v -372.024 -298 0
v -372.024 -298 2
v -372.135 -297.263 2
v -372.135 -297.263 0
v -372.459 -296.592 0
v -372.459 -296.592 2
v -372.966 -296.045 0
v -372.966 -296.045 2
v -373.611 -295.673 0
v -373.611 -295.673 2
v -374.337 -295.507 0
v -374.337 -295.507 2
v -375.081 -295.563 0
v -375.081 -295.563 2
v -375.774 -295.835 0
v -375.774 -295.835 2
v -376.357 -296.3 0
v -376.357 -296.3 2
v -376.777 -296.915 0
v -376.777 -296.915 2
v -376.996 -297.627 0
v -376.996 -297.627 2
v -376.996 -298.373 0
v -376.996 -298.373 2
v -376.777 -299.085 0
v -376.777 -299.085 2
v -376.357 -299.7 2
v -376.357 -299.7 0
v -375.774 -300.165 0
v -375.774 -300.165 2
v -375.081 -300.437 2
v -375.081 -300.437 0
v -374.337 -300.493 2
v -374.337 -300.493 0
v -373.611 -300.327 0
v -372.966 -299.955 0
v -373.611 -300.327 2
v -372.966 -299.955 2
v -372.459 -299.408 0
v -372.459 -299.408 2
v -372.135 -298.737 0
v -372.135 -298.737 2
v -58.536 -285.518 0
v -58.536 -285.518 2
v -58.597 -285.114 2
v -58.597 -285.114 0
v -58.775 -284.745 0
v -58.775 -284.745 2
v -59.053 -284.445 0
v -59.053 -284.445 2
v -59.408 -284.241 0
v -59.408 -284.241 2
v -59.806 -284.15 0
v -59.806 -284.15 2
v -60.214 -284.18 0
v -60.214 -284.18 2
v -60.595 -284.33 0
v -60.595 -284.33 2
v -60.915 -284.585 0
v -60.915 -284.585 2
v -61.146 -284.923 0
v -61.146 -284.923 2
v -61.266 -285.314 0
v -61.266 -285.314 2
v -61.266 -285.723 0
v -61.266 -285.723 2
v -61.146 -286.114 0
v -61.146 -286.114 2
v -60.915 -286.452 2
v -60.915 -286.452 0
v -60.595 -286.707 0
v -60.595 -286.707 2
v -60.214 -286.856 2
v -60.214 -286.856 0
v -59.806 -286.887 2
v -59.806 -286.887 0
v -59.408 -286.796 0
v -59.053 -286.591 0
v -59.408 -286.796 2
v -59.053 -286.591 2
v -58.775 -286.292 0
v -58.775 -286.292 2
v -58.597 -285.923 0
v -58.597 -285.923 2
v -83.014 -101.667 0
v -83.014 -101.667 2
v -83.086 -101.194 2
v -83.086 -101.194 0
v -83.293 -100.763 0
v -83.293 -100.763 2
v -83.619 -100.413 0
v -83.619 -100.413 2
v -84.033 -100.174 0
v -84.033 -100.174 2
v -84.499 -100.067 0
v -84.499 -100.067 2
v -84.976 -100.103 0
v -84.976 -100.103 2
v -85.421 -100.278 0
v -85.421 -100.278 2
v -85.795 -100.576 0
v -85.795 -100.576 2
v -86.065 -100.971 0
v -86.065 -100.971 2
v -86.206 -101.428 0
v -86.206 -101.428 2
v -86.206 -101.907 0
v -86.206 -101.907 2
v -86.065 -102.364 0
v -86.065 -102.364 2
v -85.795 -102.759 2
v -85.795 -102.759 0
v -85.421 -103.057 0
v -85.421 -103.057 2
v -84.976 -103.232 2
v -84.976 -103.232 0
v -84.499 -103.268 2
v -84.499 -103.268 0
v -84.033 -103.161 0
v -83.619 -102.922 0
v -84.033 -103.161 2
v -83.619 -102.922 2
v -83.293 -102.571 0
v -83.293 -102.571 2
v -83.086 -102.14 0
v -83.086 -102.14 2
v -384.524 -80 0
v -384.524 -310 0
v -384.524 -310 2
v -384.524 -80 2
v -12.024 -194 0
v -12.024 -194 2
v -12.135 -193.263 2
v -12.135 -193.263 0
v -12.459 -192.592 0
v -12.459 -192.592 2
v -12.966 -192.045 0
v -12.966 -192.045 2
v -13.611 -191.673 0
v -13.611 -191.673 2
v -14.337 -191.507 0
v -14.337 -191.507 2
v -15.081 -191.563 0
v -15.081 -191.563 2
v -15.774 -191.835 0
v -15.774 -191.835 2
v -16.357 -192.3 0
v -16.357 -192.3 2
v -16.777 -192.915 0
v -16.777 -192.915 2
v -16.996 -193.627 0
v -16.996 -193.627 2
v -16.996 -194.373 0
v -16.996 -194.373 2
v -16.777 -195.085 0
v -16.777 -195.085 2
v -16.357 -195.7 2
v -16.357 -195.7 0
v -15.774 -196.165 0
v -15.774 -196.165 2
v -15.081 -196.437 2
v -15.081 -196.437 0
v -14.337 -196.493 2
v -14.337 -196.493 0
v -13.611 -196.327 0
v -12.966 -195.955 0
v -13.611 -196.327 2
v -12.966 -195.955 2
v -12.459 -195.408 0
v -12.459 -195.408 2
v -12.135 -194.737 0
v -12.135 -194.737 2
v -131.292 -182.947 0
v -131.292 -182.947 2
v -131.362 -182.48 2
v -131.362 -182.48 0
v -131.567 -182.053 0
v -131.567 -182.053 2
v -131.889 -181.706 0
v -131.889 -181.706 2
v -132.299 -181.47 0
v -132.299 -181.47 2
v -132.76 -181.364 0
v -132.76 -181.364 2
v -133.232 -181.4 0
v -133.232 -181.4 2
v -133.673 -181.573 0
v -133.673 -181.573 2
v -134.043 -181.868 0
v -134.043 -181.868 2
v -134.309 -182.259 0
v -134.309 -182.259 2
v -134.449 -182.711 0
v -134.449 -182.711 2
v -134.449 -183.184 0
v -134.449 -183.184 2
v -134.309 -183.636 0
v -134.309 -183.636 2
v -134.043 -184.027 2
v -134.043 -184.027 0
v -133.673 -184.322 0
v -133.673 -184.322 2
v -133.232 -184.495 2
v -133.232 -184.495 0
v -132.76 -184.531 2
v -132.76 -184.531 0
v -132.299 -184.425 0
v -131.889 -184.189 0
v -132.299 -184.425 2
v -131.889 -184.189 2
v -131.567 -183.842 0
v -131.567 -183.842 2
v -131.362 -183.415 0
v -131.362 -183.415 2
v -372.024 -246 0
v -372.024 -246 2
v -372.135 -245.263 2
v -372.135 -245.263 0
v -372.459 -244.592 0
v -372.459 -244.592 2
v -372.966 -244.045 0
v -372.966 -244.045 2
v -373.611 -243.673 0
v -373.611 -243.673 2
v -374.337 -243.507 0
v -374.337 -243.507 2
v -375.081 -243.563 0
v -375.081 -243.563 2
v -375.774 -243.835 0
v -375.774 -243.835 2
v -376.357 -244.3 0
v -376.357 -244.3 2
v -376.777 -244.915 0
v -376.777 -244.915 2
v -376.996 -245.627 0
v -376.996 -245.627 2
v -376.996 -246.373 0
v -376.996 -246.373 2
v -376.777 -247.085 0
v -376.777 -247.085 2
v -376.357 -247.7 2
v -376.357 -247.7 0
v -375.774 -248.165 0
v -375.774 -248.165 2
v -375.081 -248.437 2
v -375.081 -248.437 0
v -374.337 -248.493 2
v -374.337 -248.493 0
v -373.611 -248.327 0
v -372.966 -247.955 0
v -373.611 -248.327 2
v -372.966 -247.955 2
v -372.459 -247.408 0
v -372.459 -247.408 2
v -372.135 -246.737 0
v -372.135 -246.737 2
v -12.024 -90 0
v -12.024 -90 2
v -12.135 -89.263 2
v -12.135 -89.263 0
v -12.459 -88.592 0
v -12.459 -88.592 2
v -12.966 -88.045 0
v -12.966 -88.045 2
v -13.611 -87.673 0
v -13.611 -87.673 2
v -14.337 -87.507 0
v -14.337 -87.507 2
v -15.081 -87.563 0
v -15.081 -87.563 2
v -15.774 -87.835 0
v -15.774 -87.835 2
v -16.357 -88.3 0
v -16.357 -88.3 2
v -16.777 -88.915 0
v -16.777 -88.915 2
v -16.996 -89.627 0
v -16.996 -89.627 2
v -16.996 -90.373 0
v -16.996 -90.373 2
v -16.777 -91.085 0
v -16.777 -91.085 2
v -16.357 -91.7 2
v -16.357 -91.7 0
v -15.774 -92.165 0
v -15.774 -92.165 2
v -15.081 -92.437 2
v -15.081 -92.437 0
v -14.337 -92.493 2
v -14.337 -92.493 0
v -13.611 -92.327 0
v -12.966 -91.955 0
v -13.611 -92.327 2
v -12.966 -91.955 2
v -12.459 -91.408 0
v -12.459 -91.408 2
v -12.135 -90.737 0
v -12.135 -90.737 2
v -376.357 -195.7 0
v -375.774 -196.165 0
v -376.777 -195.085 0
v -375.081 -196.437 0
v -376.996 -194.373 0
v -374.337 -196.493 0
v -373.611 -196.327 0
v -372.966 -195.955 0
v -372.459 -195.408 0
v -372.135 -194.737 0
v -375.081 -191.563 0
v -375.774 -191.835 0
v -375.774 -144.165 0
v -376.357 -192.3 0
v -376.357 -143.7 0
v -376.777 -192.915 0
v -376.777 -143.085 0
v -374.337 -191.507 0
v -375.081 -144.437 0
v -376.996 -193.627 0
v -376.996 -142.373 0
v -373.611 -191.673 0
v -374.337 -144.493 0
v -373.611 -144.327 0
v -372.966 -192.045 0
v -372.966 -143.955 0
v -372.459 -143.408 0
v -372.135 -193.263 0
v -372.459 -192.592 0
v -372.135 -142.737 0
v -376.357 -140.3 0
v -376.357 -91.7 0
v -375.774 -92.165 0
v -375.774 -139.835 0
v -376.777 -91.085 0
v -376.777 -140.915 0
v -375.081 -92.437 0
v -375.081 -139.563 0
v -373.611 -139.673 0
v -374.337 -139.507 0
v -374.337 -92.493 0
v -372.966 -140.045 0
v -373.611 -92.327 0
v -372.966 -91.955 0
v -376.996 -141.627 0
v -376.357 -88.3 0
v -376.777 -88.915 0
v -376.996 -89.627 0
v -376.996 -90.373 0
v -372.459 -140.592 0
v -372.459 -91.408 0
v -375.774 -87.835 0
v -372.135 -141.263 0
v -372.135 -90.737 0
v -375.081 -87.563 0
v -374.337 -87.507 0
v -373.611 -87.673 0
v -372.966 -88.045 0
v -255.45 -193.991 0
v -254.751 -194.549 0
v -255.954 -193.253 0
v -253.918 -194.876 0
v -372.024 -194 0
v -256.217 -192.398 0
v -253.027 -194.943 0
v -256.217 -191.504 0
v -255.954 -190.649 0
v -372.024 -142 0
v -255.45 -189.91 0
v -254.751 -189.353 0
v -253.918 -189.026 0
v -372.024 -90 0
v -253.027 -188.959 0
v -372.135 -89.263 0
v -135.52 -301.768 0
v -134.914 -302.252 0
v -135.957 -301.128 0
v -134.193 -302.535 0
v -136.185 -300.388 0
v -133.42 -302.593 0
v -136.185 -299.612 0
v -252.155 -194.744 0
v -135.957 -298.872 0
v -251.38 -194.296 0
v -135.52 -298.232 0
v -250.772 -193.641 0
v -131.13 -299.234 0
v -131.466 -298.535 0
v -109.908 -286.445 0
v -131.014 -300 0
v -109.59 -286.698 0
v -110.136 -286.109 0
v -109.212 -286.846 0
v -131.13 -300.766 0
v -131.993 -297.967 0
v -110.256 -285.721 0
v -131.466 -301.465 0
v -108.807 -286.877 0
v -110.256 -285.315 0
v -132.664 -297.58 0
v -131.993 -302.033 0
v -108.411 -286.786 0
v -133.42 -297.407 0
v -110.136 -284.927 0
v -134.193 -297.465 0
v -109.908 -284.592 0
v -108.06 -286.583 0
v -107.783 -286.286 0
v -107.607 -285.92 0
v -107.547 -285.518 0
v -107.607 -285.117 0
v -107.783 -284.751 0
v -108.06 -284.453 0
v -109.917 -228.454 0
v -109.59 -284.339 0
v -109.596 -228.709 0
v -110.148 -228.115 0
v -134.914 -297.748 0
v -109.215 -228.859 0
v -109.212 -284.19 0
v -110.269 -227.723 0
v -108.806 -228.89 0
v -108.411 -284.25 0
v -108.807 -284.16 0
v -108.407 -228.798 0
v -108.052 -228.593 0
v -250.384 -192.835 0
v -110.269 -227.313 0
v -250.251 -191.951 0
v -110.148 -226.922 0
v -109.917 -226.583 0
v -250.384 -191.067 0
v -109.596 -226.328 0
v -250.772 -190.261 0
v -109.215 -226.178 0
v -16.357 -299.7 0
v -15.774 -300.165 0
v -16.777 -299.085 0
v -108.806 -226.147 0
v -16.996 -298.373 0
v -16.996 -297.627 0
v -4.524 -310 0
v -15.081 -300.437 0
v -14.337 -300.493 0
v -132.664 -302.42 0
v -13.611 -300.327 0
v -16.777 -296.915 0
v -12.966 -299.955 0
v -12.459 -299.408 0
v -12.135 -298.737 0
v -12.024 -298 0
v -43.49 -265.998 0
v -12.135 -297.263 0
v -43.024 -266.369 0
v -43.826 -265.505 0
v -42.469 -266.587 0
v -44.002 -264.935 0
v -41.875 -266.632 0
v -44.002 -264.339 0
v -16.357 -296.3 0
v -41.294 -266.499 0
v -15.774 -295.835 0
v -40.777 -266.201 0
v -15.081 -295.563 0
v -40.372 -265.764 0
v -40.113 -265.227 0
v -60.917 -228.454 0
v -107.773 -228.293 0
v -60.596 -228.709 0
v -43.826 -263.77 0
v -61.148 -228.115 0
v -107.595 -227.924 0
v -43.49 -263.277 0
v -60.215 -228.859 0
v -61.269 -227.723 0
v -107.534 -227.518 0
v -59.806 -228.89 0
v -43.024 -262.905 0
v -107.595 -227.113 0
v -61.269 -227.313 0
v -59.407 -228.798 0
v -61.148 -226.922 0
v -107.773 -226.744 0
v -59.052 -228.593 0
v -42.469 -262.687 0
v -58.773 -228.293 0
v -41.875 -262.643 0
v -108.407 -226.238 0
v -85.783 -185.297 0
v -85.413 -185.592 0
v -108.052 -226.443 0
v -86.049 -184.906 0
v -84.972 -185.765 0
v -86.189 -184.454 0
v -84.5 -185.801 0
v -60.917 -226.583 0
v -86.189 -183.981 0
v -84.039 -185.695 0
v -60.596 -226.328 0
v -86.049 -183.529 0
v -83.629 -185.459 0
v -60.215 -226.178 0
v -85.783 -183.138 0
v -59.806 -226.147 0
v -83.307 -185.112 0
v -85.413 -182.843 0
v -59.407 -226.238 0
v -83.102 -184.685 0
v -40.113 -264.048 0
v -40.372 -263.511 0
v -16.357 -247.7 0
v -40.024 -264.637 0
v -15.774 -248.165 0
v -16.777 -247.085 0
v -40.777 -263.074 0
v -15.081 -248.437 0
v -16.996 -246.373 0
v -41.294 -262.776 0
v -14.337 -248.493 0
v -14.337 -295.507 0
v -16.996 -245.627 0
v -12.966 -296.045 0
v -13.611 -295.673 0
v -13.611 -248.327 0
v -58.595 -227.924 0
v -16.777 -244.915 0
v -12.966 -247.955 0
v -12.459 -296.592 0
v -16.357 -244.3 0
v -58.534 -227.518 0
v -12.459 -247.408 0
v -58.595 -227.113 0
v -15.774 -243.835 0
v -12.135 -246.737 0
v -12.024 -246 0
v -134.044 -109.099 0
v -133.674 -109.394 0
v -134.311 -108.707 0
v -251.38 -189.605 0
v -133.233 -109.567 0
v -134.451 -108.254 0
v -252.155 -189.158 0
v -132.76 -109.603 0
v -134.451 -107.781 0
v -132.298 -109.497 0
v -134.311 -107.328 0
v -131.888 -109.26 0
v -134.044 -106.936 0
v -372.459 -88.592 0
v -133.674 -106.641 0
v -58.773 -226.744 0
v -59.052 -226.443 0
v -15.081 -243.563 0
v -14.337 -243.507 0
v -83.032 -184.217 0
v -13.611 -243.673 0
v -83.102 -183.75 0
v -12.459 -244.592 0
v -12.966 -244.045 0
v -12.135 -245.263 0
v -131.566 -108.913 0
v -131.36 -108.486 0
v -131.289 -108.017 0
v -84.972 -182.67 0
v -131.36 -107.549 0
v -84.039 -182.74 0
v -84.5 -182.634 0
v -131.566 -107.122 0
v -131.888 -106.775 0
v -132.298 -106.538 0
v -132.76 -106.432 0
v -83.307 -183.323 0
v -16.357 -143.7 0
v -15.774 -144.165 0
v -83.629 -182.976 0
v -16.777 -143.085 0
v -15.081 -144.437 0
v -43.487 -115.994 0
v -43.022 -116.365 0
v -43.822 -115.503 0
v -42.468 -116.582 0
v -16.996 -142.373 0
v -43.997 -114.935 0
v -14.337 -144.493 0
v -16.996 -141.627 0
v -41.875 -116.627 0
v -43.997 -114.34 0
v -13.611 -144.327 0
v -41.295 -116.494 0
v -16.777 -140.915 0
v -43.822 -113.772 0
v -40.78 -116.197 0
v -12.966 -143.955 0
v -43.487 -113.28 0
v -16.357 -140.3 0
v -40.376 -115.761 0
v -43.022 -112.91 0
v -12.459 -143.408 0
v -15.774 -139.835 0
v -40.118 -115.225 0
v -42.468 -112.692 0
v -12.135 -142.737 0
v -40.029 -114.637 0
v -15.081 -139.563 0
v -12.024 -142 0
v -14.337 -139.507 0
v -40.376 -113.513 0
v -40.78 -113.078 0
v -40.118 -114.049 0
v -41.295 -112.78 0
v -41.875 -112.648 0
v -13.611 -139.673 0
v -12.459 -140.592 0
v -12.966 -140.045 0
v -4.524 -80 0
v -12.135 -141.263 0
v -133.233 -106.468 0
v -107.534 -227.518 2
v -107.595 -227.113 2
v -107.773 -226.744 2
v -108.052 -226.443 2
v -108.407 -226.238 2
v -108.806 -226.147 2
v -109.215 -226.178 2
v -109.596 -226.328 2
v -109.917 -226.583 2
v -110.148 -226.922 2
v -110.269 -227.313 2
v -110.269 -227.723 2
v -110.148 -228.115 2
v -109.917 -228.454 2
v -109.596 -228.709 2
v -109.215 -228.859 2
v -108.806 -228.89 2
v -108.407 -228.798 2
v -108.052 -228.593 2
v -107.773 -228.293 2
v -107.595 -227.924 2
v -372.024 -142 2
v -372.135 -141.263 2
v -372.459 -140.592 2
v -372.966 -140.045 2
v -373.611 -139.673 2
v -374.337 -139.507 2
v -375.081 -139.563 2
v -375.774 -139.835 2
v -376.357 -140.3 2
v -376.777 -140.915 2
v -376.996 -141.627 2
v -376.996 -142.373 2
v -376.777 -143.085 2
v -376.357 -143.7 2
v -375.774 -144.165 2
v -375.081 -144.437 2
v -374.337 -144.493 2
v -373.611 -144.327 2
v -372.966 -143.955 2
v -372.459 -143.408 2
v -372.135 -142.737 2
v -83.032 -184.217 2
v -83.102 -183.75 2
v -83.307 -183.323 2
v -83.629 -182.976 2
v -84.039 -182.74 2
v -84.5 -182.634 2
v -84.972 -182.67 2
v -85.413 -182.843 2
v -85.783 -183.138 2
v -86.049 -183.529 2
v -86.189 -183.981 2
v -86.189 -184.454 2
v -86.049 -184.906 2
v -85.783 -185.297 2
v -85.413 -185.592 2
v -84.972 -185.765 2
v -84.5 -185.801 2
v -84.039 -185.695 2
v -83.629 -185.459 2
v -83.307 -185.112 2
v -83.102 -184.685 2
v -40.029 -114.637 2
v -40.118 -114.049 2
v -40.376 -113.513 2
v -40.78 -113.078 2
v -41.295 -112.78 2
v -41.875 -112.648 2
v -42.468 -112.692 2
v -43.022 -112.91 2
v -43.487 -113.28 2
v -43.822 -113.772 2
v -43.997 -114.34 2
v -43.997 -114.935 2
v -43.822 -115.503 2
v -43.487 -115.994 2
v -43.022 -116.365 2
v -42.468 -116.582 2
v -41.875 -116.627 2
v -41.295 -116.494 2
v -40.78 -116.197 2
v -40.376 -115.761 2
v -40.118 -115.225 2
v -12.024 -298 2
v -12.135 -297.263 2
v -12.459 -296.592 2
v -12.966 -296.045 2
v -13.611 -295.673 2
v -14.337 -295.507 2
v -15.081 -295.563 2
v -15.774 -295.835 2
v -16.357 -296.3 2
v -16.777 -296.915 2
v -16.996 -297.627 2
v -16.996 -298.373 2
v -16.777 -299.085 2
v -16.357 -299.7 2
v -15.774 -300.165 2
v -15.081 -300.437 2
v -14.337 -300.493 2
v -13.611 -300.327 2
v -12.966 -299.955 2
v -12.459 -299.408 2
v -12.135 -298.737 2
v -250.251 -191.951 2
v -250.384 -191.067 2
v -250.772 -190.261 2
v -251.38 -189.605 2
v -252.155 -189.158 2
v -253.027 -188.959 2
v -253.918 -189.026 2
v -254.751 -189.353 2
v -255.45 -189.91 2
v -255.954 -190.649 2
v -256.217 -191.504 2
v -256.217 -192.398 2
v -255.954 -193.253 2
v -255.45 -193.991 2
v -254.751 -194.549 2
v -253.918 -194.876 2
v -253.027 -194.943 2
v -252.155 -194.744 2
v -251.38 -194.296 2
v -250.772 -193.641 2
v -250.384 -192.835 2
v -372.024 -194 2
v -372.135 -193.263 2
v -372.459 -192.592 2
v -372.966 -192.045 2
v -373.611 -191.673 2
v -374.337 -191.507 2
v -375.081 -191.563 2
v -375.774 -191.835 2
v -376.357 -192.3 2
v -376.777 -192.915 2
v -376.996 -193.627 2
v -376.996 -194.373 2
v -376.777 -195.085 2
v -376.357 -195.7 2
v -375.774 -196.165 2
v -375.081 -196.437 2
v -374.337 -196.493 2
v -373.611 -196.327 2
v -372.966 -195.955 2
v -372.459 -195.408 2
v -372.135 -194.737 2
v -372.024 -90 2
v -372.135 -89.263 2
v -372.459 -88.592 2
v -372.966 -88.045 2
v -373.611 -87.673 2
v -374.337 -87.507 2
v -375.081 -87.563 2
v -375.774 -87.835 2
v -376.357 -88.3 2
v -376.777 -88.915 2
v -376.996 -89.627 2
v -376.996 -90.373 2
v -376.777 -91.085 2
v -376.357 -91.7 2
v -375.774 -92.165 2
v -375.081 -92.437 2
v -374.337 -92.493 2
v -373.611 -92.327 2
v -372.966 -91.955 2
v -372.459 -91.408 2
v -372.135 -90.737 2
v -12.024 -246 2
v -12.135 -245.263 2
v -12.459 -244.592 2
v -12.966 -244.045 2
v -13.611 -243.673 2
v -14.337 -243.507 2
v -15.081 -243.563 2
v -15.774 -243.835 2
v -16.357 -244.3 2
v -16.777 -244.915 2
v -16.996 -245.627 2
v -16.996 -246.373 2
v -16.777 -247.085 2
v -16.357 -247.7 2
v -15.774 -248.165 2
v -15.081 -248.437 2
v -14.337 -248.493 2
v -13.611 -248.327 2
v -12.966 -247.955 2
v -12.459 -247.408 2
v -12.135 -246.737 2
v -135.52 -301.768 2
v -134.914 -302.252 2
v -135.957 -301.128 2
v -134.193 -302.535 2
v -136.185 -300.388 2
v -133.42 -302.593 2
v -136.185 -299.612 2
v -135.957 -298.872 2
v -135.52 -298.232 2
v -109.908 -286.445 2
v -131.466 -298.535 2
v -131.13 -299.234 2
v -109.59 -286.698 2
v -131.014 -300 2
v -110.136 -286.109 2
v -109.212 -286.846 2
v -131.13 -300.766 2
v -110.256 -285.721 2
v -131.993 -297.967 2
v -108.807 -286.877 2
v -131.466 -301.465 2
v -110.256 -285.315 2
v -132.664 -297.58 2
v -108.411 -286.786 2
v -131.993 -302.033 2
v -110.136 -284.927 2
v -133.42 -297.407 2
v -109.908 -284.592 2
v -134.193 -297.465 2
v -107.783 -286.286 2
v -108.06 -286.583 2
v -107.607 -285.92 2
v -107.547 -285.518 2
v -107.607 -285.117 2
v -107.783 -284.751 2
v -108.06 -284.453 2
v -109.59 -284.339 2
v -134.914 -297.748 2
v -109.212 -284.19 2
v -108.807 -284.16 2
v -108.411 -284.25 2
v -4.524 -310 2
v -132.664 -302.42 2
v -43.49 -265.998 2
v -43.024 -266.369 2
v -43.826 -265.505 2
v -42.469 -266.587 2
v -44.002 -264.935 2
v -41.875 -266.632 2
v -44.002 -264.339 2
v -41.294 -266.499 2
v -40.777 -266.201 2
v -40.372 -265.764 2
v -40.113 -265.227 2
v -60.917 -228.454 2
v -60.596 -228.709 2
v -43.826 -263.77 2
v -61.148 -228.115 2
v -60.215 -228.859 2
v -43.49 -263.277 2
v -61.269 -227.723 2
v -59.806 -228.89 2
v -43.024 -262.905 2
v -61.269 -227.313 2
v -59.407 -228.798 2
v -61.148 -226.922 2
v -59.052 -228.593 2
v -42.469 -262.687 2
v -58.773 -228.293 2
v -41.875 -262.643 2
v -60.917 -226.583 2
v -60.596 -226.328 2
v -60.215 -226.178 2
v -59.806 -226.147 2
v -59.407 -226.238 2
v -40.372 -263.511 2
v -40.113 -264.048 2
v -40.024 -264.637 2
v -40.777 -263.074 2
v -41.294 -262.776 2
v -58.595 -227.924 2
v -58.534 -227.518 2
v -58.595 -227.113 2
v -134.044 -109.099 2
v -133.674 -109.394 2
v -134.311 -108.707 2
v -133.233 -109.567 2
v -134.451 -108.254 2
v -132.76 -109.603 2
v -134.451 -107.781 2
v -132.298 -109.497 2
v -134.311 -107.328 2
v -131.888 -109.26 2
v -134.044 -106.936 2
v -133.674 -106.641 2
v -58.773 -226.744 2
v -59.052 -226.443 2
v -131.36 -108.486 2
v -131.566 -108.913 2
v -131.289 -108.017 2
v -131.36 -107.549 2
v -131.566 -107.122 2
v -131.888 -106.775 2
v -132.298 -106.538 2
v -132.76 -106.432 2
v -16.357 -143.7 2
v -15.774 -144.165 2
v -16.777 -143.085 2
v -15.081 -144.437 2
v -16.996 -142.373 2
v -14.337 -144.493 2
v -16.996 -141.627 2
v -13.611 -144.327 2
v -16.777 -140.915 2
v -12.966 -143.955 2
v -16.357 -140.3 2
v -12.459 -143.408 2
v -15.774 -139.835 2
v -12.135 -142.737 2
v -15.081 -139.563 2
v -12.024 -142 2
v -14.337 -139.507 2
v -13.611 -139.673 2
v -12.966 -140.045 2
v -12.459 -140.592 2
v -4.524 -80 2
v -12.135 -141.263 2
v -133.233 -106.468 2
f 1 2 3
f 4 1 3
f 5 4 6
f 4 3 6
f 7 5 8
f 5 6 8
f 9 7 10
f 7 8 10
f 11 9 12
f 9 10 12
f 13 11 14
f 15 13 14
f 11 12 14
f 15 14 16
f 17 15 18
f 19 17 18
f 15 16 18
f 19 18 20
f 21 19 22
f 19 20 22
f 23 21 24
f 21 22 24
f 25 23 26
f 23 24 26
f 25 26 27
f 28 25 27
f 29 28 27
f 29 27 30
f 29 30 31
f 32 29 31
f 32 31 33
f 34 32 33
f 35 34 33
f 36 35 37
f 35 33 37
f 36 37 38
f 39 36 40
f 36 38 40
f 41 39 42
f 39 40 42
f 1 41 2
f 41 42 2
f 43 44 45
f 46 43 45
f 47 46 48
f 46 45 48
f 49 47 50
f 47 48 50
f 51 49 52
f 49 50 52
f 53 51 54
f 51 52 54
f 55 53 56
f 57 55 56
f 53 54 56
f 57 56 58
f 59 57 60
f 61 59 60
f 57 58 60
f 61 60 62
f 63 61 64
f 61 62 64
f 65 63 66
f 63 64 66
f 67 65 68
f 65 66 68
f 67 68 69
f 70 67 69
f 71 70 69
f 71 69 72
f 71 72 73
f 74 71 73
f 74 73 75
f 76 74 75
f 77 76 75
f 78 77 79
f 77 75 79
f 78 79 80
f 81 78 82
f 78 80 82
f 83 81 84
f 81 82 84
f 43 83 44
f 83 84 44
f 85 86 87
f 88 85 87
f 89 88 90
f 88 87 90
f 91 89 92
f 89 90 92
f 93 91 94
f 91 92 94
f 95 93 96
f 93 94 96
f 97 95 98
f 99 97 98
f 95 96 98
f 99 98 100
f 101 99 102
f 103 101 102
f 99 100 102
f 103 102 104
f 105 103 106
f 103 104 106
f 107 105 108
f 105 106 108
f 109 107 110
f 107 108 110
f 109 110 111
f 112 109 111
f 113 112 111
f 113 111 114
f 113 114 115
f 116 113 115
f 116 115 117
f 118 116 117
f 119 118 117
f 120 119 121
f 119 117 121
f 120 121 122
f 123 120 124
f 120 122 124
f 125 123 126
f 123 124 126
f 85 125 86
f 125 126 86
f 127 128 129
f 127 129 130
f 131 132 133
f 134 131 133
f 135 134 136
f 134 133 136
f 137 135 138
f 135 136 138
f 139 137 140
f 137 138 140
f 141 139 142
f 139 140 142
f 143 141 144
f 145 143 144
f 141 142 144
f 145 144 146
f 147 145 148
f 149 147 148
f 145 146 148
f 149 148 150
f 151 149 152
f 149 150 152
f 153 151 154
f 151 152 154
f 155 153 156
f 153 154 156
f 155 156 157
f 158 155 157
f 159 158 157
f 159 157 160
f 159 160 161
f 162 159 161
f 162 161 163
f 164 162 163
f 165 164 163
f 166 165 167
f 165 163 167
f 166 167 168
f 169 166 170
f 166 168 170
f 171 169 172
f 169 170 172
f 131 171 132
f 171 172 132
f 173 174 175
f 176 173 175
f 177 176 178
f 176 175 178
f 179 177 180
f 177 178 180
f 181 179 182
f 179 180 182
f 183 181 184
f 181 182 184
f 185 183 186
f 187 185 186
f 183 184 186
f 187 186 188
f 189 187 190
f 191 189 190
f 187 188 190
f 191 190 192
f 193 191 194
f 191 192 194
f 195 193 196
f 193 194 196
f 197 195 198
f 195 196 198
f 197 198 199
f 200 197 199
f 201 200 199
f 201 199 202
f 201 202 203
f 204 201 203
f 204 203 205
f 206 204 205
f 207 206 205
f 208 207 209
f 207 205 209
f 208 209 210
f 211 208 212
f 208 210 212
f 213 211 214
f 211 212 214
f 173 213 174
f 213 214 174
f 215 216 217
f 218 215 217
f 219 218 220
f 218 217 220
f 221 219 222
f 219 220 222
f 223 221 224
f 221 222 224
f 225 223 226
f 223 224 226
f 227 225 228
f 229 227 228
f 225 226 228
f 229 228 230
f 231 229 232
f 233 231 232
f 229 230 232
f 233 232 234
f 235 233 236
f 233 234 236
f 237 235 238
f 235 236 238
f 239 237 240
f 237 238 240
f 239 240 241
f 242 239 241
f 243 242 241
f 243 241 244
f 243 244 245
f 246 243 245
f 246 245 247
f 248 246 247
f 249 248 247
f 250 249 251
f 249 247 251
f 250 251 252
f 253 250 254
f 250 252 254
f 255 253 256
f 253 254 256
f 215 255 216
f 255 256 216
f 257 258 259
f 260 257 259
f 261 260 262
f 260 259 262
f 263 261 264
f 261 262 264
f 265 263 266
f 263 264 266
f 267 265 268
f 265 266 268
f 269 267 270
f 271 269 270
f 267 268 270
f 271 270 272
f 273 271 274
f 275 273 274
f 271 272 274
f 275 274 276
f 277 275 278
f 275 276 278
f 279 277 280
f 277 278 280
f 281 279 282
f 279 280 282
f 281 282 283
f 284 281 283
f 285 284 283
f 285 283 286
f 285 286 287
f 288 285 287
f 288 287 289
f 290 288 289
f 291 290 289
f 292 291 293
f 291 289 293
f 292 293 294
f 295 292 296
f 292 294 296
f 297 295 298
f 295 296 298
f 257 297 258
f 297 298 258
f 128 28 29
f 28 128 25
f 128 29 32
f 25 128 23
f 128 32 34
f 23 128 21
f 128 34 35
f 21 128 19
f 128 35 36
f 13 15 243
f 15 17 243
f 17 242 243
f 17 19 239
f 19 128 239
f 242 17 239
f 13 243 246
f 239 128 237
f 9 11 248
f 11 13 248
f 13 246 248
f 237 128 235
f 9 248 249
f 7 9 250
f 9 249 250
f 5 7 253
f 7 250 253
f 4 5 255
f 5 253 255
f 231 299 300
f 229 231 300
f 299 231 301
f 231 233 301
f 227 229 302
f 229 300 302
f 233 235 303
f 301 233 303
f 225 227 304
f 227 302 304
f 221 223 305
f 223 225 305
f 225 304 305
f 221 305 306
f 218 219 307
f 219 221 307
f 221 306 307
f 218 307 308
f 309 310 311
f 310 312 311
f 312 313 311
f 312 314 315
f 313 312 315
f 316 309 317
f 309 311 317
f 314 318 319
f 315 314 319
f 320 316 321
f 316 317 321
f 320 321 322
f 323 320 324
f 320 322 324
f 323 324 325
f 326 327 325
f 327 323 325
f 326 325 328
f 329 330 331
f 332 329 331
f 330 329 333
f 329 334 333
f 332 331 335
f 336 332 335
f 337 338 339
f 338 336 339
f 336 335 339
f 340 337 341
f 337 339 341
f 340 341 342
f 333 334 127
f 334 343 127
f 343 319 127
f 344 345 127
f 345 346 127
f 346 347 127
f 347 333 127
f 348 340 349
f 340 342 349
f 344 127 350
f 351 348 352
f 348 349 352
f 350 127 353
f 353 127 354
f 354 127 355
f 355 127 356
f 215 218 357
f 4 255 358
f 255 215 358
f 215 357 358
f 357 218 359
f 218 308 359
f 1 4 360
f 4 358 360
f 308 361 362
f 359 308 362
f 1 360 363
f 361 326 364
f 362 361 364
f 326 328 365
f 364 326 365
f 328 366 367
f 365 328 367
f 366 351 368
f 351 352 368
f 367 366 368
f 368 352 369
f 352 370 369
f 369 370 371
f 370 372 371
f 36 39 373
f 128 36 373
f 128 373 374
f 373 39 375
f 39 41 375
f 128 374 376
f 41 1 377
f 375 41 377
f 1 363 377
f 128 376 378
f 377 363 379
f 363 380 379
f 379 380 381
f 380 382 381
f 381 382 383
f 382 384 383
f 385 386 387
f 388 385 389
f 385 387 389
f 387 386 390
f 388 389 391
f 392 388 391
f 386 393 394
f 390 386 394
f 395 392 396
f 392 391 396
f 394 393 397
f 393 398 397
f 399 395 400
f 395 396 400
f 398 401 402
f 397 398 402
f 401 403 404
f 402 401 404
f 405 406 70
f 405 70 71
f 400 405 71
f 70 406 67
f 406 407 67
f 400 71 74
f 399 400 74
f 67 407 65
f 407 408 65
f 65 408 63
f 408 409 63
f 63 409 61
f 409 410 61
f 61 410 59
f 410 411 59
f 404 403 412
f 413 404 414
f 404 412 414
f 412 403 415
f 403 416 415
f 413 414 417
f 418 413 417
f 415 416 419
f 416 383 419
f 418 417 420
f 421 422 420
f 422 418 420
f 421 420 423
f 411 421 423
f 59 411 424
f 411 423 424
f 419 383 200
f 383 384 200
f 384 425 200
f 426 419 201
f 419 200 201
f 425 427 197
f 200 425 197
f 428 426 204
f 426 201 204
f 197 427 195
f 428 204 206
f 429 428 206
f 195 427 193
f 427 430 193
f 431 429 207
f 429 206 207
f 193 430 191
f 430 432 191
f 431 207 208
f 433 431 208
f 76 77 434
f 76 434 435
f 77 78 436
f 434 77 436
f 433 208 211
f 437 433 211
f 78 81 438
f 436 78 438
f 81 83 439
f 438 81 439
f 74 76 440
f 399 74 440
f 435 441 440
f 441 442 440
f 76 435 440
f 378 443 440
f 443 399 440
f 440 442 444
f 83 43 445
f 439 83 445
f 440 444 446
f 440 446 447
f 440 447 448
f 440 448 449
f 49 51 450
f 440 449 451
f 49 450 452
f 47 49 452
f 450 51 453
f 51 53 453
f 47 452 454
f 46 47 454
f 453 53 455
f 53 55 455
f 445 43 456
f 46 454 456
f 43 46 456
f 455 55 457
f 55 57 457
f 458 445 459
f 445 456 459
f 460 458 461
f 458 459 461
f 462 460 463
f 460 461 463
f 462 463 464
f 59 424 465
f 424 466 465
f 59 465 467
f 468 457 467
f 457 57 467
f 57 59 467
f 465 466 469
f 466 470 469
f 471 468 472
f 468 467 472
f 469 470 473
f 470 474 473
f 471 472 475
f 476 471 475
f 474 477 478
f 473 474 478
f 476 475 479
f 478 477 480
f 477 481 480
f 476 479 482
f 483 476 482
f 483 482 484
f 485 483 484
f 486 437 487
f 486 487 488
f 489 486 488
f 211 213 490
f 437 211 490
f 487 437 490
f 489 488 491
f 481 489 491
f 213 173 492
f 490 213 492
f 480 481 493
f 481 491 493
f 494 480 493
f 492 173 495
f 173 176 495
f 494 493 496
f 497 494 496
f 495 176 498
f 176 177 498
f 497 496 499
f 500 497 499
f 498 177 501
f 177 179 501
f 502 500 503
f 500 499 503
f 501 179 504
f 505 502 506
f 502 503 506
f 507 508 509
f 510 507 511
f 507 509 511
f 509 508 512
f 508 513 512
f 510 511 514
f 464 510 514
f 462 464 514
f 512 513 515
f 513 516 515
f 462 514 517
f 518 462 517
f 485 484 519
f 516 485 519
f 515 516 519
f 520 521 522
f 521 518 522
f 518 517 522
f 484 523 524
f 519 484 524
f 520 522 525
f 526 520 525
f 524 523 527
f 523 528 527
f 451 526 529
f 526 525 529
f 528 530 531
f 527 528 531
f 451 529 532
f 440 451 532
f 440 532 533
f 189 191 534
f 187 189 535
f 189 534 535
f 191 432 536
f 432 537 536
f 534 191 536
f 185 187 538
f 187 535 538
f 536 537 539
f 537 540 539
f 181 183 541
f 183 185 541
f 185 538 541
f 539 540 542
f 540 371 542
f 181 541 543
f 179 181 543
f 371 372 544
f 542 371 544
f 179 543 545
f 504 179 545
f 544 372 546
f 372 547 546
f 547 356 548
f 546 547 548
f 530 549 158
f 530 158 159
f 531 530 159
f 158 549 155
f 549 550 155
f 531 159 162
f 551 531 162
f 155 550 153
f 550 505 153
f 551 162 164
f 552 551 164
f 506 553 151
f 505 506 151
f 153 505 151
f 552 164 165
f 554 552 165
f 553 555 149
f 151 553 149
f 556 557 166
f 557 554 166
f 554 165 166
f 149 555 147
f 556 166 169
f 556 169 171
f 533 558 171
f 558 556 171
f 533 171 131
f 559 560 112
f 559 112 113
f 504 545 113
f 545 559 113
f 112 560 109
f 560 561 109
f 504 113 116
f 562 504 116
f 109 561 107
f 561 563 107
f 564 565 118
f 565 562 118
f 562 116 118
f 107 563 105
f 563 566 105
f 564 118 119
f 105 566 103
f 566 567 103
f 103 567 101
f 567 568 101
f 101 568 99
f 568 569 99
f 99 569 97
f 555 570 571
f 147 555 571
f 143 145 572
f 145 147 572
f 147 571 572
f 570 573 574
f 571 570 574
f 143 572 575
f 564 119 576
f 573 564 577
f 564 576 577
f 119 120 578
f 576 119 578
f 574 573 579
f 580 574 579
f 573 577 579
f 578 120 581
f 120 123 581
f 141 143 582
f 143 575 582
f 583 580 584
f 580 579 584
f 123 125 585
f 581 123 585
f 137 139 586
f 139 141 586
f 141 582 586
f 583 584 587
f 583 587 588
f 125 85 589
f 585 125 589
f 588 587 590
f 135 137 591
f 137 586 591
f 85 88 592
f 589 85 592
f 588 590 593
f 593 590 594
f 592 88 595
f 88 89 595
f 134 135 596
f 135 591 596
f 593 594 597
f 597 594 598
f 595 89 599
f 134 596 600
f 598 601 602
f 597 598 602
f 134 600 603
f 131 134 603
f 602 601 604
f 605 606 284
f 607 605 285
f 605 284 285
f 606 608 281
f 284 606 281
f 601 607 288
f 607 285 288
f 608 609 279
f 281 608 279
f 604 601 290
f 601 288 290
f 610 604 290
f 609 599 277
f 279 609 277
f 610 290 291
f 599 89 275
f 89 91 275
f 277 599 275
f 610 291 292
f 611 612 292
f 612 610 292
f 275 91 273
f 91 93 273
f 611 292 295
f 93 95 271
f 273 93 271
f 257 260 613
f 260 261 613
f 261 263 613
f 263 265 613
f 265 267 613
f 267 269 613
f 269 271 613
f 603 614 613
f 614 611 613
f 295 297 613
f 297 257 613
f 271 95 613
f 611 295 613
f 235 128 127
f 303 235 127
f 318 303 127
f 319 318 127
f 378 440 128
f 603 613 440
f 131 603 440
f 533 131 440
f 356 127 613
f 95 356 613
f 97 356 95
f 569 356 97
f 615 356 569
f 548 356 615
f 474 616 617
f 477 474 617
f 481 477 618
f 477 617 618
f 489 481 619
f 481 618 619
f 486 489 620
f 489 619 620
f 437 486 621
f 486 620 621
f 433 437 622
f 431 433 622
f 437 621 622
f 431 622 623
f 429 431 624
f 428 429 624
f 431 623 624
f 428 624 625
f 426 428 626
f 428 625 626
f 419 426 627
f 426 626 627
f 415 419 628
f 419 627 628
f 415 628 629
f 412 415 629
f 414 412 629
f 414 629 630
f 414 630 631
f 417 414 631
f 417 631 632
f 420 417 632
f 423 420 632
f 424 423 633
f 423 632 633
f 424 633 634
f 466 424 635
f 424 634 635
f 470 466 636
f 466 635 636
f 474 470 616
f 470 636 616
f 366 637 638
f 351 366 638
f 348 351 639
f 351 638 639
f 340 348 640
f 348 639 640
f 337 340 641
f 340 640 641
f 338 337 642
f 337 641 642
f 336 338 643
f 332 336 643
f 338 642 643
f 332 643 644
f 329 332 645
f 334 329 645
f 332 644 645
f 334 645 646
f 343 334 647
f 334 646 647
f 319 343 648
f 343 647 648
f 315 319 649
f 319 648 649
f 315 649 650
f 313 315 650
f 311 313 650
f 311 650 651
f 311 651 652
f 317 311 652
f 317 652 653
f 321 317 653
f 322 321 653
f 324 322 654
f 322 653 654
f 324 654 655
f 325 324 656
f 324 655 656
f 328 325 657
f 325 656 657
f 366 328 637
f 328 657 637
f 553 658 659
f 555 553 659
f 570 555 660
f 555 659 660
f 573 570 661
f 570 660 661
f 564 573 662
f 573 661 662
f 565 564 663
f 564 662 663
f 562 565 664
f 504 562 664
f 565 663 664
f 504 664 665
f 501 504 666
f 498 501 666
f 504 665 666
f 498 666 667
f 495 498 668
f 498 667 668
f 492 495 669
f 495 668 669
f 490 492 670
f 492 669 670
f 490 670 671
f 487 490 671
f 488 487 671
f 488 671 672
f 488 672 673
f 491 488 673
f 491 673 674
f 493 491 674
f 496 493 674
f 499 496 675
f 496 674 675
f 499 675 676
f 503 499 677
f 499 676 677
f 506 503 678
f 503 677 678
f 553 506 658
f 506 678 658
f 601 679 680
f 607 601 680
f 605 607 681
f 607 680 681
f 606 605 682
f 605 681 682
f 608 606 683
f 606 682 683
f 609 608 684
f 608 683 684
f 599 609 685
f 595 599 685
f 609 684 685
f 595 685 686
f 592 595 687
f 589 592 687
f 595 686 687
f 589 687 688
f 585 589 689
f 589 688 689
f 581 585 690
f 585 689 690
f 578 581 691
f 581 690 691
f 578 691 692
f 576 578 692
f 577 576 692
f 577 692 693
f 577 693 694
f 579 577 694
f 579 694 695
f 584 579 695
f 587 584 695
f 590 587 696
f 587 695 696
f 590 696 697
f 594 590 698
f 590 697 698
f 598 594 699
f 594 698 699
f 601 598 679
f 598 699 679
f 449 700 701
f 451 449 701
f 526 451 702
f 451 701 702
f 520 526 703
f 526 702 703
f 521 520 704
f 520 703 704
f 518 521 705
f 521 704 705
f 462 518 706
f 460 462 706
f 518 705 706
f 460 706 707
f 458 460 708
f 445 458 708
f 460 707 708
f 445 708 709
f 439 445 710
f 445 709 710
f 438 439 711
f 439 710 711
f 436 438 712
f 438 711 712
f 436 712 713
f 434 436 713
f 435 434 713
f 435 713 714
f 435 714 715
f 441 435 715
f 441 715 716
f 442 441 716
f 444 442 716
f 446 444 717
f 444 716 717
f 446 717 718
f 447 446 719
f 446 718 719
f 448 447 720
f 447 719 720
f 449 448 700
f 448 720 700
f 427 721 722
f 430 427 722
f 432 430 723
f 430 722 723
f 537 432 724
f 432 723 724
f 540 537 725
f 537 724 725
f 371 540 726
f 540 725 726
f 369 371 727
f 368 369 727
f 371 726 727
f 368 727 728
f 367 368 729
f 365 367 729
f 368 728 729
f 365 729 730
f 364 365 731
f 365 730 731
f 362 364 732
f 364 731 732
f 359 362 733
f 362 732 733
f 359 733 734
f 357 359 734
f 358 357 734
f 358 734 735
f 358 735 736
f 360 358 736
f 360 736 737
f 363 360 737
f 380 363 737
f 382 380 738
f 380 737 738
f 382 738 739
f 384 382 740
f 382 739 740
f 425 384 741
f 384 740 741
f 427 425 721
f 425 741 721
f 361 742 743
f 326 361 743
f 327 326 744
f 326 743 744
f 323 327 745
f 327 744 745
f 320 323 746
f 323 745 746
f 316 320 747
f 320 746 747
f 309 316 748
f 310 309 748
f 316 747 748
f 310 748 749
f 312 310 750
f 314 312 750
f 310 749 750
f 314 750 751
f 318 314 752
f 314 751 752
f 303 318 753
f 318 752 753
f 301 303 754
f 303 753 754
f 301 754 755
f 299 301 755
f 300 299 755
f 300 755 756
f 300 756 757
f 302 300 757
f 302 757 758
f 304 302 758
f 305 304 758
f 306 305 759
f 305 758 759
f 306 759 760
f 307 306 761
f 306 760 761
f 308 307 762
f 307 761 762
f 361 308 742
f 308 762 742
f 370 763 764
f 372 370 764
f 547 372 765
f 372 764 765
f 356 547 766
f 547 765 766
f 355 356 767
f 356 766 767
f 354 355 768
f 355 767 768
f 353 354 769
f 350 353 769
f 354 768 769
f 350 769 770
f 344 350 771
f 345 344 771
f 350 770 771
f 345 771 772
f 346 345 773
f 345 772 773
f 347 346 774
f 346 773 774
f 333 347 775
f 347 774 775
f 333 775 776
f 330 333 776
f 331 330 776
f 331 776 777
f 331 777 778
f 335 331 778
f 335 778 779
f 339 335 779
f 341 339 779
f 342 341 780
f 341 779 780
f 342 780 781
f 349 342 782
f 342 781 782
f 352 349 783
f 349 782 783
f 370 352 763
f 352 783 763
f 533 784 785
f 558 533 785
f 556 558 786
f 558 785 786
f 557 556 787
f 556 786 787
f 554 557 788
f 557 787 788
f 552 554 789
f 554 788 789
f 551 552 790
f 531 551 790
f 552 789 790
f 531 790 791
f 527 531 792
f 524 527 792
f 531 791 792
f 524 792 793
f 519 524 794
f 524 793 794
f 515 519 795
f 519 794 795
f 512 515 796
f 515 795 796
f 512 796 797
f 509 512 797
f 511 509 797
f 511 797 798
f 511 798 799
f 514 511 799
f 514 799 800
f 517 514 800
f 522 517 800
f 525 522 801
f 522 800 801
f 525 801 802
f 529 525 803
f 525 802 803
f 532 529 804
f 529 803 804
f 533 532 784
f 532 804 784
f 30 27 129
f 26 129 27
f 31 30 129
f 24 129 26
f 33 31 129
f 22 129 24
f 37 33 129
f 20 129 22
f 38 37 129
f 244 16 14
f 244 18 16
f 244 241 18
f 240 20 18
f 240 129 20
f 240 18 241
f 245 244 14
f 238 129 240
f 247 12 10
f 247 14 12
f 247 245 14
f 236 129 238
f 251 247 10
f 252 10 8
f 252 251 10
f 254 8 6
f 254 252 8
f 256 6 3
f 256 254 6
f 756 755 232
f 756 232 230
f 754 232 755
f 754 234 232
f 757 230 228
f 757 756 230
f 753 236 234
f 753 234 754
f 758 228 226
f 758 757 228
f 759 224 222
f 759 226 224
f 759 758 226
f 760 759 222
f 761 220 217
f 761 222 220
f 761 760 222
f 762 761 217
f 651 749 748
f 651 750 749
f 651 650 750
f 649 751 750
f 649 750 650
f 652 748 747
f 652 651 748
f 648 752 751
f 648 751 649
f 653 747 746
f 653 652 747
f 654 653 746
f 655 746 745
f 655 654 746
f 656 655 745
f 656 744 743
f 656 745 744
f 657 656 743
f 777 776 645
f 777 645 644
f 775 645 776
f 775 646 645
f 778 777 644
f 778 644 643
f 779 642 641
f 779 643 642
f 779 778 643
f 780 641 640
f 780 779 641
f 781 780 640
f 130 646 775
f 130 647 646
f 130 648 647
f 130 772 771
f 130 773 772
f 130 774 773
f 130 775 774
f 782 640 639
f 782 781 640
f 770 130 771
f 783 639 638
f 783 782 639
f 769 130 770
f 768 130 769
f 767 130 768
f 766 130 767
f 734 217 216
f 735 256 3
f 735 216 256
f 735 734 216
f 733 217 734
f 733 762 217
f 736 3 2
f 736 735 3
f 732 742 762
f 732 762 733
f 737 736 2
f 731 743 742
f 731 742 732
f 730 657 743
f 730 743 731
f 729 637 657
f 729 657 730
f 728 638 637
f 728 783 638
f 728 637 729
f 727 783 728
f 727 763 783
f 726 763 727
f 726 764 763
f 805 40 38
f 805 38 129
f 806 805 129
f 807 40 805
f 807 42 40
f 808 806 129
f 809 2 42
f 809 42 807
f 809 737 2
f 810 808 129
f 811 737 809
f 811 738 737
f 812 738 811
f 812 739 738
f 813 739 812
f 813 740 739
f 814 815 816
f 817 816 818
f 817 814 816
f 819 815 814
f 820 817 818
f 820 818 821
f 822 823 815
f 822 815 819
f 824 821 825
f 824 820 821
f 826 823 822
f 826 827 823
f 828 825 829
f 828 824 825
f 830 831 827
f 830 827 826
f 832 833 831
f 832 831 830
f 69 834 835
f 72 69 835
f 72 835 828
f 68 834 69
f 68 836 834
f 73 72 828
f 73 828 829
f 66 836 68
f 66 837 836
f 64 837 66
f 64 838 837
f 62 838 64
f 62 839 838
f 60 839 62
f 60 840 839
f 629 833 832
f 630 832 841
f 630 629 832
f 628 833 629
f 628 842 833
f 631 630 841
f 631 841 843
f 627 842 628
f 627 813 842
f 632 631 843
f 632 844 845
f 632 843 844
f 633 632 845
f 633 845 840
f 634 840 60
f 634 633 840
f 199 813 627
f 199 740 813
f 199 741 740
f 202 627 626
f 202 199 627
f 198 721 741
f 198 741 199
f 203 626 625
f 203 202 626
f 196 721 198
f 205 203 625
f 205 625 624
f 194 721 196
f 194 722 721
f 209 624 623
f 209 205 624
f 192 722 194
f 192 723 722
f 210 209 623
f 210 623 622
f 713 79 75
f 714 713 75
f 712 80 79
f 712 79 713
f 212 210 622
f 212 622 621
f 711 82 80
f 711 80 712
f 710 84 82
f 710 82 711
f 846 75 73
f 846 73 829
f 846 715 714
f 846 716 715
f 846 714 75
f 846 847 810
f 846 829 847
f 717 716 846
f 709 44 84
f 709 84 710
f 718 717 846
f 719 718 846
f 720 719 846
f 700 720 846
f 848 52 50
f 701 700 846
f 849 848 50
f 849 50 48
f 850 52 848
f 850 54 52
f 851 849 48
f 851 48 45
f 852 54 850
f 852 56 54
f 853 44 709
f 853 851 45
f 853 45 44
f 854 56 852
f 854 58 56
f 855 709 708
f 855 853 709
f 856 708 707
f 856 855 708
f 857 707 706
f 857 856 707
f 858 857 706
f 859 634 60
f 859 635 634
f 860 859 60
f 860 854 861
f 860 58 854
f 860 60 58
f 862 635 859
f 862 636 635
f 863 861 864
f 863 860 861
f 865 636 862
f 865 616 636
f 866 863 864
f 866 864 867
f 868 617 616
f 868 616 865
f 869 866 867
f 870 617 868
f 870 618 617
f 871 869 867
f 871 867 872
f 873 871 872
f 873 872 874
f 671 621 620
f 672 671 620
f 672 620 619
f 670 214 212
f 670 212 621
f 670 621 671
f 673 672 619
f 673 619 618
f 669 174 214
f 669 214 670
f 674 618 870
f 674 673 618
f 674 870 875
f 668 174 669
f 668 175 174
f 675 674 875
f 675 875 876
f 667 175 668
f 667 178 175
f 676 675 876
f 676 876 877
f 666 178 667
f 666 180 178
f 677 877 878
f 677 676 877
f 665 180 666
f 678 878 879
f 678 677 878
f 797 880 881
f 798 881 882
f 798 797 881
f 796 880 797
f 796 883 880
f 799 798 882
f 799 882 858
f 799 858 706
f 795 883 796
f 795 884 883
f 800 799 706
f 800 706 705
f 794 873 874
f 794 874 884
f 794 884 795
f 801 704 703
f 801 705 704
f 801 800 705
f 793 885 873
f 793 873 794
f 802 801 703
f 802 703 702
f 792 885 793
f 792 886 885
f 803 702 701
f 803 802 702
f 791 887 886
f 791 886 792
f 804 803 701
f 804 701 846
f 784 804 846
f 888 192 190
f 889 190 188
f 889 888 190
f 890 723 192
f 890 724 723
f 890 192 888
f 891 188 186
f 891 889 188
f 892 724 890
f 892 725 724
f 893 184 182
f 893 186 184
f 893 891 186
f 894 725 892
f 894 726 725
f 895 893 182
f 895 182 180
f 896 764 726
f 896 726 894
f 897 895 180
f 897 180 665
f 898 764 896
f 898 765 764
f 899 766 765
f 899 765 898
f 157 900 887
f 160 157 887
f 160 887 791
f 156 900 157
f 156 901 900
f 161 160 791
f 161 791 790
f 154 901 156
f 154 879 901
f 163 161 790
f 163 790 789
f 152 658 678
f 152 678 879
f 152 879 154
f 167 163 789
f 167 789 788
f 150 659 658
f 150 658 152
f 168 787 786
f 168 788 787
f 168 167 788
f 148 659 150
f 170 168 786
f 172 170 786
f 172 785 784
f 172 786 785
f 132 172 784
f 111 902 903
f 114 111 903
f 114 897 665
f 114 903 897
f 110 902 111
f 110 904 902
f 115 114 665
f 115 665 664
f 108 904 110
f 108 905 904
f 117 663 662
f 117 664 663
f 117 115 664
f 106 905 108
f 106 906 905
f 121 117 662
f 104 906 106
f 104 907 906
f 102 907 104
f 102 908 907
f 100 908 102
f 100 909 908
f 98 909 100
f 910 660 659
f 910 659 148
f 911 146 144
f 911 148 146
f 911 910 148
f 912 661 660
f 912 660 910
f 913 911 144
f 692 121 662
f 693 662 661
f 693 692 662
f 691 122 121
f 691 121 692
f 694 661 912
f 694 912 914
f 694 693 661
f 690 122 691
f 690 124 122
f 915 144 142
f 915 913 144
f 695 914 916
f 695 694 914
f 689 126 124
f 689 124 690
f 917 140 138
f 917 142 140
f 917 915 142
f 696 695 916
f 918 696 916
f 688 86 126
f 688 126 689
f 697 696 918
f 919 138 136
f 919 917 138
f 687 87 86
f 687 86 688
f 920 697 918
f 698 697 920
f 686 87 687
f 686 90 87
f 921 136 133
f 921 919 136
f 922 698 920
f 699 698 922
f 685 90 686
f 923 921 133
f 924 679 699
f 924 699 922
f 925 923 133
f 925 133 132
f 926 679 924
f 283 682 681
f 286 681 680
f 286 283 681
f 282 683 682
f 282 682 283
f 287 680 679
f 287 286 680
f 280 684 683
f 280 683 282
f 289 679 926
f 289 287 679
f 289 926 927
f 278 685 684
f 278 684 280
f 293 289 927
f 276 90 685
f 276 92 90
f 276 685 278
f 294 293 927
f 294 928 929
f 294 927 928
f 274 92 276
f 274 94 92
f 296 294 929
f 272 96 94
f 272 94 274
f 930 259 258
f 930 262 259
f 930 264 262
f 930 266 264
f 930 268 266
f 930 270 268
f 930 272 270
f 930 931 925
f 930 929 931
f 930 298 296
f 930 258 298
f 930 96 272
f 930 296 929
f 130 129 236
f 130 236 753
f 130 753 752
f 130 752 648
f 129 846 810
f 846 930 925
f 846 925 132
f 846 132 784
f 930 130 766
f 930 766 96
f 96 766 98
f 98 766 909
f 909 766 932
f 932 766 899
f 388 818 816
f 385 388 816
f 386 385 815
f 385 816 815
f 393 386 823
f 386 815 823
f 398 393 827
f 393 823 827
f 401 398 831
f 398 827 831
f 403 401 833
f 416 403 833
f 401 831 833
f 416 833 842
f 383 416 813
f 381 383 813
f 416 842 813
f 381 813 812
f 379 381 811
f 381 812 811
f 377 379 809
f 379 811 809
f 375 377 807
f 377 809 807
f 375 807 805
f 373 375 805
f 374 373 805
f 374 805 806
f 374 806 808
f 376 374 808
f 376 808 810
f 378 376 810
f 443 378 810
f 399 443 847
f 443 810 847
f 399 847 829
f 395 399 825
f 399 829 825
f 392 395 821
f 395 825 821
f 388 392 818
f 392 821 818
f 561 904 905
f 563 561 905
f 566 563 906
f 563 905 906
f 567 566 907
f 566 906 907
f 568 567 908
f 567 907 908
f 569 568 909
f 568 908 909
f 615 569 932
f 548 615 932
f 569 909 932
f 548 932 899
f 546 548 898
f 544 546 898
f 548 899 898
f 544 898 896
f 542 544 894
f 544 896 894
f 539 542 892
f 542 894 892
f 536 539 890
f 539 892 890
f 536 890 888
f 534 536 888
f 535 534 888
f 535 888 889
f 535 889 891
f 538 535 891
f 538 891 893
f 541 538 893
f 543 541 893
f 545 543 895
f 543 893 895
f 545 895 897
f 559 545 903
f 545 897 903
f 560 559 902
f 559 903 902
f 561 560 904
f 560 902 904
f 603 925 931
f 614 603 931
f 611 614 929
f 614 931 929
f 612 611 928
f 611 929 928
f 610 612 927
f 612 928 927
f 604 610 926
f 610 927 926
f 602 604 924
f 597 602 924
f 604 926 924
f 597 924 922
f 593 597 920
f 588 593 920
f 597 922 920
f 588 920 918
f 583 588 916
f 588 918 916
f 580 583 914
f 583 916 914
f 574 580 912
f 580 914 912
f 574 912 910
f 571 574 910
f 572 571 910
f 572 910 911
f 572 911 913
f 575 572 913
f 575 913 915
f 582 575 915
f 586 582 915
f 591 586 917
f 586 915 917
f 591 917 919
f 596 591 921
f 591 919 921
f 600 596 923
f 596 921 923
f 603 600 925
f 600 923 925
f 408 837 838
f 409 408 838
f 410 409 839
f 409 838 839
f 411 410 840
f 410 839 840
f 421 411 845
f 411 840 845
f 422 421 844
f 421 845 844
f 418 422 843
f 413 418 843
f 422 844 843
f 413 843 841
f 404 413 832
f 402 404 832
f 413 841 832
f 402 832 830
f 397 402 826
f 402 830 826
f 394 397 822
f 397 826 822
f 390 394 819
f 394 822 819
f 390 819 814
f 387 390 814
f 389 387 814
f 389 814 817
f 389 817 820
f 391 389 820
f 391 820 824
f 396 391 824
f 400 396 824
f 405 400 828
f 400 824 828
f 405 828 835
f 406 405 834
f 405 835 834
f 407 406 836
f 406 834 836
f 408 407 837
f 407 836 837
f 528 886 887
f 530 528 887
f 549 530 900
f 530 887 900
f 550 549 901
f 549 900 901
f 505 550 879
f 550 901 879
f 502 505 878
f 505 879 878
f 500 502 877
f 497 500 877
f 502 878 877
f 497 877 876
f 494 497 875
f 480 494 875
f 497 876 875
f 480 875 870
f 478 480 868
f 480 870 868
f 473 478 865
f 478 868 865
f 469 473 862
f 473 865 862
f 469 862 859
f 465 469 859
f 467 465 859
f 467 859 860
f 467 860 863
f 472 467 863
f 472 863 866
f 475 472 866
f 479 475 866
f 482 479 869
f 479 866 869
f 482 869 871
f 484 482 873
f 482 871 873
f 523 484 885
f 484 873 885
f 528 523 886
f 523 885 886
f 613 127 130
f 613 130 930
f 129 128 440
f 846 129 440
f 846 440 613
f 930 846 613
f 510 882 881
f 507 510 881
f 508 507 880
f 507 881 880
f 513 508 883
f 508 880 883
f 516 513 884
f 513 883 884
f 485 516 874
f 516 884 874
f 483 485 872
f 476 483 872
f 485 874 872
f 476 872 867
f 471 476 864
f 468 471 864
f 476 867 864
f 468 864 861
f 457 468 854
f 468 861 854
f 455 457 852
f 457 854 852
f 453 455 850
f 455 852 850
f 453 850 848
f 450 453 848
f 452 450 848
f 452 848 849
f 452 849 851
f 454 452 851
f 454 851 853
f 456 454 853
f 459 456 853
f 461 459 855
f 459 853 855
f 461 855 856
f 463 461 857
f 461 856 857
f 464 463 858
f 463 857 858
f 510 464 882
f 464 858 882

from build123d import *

# Parameters (mm, degrees)
SKICA2_W                 = 380
SKICA2_H                 = 230
P_IDAT_VYSUNUT_M1_DEPTH  = 2
SKICA3_R                 = 2.5
ODEBRAT_VYSUNUT_M1_DEPTH = 2
SKICA4_R                 = 1.604768665
SKICA4_R_2               = 1.589689297
SKICA4_R_3               = 1.5875
SKICA4_R_4               = 1.375
SKICA4_R_5               = 1.372501574
SKICA4_R_6               = 1.362238747
SKICA4_R_7               = 2
SKICA4_R_8               = 1.99507446
SKICA4_R_9               = 3
ODEBRAT_VYSUNUT_M2_DEPTH = 2
SKICA5_R                 = 2.6
ODEBRAT_VYSUNUT_M3_DEPTH = 2


with BuildPart() as part:
    # Skica2 → Přidat vysunutím1 (new body)
    with BuildSketch(Plane.XY):
        with Locations((-194.524287798, -195)):
            Rectangle(SKICA2_W, SKICA2_H)
    extrude(amount=P_IDAT_VYSUNUT_M1_DEPTH)

    # Skica3 → Odebrat vysunutím1 (cut)
    with BuildSketch(Plane.XY.offset(2)):
        with Locations((-374.524287798, -90)):
            Circle(SKICA3_R)
        with Locations((-374.524287798, -142)):
            Circle(SKICA3_R)
        with Locations((-374.524287798, -194)):
            Circle(SKICA3_R)
        with Locations((-374.524287798, -246)):
            Circle(SKICA3_R)
        with Locations((-374.524287798, -298)):
            Circle(SKICA3_R)
        with Locations((-14.524287798, -246)):
            Circle(SKICA3_R)
        with Locations((-14.524287798, -298)):
            Circle(SKICA3_R)
        with Locations((-14.524287798, -194)):
            Circle(SKICA3_R)
        with Locations((-14.524287798, -142)):
            Circle(SKICA3_R)
        with Locations((-14.524287798, -90)):
            Circle(SKICA3_R)
    extrude(amount=-ODEBRAT_VYSUNUT_M1_DEPTH, mode=Mode.SUBTRACT)

    # Skica4 → Odebrat vysunutím2 (cut)
    with BuildSketch(Plane.XY.offset(2)):
        with Locations((-84.619074008, -101.667480714)):
            Circle(SKICA4_R)
        with Locations((-132.879074008, -108.017480714)):
            Circle(SKICA4_R_2)
        with Locations((-132.879074008, -182.947480714)):
            Circle(SKICA4_R_3)
        with Locations((-84.619074008, -184.217480714)):
            Circle(SKICA4_R_3)
        with Locations((-108.908932218, -227.518390056)):
            Circle(SKICA4_R_4)
        with Locations((-59.908932218, -227.518390056)):
            Circle(SKICA4_R_4)
        with Locations((-59.908932218, -285.518390056)):
            Circle(SKICA4_R_5)
        with Locations((-108.908932218, -285.518390056)):
            Circle(SKICA4_R_6)
        with Locations((-42.024287798, -264.637326757)):
            Circle(SKICA4_R_7)
        with Locations((-42.024287798, -114.637326757)):
            Circle(SKICA4_R_8)
        with Locations((-253.250828503, -191.950902839)):
            Circle(SKICA4_R_9)
    extrude(amount=-ODEBRAT_VYSUNUT_M2_DEPTH, mode=Mode.SUBTRACT)

    # Skica5 → Odebrat vysunutím3 (cut)
    with BuildSketch(Plane.XY.offset(2)):
        with Locations((-133.614229541, -300)):
            Circle(SKICA5_R)
    extrude(amount=-ODEBRAT_VYSUNUT_M3_DEPTH, mode=Mode.SUBTRACT)


solid = part.part
